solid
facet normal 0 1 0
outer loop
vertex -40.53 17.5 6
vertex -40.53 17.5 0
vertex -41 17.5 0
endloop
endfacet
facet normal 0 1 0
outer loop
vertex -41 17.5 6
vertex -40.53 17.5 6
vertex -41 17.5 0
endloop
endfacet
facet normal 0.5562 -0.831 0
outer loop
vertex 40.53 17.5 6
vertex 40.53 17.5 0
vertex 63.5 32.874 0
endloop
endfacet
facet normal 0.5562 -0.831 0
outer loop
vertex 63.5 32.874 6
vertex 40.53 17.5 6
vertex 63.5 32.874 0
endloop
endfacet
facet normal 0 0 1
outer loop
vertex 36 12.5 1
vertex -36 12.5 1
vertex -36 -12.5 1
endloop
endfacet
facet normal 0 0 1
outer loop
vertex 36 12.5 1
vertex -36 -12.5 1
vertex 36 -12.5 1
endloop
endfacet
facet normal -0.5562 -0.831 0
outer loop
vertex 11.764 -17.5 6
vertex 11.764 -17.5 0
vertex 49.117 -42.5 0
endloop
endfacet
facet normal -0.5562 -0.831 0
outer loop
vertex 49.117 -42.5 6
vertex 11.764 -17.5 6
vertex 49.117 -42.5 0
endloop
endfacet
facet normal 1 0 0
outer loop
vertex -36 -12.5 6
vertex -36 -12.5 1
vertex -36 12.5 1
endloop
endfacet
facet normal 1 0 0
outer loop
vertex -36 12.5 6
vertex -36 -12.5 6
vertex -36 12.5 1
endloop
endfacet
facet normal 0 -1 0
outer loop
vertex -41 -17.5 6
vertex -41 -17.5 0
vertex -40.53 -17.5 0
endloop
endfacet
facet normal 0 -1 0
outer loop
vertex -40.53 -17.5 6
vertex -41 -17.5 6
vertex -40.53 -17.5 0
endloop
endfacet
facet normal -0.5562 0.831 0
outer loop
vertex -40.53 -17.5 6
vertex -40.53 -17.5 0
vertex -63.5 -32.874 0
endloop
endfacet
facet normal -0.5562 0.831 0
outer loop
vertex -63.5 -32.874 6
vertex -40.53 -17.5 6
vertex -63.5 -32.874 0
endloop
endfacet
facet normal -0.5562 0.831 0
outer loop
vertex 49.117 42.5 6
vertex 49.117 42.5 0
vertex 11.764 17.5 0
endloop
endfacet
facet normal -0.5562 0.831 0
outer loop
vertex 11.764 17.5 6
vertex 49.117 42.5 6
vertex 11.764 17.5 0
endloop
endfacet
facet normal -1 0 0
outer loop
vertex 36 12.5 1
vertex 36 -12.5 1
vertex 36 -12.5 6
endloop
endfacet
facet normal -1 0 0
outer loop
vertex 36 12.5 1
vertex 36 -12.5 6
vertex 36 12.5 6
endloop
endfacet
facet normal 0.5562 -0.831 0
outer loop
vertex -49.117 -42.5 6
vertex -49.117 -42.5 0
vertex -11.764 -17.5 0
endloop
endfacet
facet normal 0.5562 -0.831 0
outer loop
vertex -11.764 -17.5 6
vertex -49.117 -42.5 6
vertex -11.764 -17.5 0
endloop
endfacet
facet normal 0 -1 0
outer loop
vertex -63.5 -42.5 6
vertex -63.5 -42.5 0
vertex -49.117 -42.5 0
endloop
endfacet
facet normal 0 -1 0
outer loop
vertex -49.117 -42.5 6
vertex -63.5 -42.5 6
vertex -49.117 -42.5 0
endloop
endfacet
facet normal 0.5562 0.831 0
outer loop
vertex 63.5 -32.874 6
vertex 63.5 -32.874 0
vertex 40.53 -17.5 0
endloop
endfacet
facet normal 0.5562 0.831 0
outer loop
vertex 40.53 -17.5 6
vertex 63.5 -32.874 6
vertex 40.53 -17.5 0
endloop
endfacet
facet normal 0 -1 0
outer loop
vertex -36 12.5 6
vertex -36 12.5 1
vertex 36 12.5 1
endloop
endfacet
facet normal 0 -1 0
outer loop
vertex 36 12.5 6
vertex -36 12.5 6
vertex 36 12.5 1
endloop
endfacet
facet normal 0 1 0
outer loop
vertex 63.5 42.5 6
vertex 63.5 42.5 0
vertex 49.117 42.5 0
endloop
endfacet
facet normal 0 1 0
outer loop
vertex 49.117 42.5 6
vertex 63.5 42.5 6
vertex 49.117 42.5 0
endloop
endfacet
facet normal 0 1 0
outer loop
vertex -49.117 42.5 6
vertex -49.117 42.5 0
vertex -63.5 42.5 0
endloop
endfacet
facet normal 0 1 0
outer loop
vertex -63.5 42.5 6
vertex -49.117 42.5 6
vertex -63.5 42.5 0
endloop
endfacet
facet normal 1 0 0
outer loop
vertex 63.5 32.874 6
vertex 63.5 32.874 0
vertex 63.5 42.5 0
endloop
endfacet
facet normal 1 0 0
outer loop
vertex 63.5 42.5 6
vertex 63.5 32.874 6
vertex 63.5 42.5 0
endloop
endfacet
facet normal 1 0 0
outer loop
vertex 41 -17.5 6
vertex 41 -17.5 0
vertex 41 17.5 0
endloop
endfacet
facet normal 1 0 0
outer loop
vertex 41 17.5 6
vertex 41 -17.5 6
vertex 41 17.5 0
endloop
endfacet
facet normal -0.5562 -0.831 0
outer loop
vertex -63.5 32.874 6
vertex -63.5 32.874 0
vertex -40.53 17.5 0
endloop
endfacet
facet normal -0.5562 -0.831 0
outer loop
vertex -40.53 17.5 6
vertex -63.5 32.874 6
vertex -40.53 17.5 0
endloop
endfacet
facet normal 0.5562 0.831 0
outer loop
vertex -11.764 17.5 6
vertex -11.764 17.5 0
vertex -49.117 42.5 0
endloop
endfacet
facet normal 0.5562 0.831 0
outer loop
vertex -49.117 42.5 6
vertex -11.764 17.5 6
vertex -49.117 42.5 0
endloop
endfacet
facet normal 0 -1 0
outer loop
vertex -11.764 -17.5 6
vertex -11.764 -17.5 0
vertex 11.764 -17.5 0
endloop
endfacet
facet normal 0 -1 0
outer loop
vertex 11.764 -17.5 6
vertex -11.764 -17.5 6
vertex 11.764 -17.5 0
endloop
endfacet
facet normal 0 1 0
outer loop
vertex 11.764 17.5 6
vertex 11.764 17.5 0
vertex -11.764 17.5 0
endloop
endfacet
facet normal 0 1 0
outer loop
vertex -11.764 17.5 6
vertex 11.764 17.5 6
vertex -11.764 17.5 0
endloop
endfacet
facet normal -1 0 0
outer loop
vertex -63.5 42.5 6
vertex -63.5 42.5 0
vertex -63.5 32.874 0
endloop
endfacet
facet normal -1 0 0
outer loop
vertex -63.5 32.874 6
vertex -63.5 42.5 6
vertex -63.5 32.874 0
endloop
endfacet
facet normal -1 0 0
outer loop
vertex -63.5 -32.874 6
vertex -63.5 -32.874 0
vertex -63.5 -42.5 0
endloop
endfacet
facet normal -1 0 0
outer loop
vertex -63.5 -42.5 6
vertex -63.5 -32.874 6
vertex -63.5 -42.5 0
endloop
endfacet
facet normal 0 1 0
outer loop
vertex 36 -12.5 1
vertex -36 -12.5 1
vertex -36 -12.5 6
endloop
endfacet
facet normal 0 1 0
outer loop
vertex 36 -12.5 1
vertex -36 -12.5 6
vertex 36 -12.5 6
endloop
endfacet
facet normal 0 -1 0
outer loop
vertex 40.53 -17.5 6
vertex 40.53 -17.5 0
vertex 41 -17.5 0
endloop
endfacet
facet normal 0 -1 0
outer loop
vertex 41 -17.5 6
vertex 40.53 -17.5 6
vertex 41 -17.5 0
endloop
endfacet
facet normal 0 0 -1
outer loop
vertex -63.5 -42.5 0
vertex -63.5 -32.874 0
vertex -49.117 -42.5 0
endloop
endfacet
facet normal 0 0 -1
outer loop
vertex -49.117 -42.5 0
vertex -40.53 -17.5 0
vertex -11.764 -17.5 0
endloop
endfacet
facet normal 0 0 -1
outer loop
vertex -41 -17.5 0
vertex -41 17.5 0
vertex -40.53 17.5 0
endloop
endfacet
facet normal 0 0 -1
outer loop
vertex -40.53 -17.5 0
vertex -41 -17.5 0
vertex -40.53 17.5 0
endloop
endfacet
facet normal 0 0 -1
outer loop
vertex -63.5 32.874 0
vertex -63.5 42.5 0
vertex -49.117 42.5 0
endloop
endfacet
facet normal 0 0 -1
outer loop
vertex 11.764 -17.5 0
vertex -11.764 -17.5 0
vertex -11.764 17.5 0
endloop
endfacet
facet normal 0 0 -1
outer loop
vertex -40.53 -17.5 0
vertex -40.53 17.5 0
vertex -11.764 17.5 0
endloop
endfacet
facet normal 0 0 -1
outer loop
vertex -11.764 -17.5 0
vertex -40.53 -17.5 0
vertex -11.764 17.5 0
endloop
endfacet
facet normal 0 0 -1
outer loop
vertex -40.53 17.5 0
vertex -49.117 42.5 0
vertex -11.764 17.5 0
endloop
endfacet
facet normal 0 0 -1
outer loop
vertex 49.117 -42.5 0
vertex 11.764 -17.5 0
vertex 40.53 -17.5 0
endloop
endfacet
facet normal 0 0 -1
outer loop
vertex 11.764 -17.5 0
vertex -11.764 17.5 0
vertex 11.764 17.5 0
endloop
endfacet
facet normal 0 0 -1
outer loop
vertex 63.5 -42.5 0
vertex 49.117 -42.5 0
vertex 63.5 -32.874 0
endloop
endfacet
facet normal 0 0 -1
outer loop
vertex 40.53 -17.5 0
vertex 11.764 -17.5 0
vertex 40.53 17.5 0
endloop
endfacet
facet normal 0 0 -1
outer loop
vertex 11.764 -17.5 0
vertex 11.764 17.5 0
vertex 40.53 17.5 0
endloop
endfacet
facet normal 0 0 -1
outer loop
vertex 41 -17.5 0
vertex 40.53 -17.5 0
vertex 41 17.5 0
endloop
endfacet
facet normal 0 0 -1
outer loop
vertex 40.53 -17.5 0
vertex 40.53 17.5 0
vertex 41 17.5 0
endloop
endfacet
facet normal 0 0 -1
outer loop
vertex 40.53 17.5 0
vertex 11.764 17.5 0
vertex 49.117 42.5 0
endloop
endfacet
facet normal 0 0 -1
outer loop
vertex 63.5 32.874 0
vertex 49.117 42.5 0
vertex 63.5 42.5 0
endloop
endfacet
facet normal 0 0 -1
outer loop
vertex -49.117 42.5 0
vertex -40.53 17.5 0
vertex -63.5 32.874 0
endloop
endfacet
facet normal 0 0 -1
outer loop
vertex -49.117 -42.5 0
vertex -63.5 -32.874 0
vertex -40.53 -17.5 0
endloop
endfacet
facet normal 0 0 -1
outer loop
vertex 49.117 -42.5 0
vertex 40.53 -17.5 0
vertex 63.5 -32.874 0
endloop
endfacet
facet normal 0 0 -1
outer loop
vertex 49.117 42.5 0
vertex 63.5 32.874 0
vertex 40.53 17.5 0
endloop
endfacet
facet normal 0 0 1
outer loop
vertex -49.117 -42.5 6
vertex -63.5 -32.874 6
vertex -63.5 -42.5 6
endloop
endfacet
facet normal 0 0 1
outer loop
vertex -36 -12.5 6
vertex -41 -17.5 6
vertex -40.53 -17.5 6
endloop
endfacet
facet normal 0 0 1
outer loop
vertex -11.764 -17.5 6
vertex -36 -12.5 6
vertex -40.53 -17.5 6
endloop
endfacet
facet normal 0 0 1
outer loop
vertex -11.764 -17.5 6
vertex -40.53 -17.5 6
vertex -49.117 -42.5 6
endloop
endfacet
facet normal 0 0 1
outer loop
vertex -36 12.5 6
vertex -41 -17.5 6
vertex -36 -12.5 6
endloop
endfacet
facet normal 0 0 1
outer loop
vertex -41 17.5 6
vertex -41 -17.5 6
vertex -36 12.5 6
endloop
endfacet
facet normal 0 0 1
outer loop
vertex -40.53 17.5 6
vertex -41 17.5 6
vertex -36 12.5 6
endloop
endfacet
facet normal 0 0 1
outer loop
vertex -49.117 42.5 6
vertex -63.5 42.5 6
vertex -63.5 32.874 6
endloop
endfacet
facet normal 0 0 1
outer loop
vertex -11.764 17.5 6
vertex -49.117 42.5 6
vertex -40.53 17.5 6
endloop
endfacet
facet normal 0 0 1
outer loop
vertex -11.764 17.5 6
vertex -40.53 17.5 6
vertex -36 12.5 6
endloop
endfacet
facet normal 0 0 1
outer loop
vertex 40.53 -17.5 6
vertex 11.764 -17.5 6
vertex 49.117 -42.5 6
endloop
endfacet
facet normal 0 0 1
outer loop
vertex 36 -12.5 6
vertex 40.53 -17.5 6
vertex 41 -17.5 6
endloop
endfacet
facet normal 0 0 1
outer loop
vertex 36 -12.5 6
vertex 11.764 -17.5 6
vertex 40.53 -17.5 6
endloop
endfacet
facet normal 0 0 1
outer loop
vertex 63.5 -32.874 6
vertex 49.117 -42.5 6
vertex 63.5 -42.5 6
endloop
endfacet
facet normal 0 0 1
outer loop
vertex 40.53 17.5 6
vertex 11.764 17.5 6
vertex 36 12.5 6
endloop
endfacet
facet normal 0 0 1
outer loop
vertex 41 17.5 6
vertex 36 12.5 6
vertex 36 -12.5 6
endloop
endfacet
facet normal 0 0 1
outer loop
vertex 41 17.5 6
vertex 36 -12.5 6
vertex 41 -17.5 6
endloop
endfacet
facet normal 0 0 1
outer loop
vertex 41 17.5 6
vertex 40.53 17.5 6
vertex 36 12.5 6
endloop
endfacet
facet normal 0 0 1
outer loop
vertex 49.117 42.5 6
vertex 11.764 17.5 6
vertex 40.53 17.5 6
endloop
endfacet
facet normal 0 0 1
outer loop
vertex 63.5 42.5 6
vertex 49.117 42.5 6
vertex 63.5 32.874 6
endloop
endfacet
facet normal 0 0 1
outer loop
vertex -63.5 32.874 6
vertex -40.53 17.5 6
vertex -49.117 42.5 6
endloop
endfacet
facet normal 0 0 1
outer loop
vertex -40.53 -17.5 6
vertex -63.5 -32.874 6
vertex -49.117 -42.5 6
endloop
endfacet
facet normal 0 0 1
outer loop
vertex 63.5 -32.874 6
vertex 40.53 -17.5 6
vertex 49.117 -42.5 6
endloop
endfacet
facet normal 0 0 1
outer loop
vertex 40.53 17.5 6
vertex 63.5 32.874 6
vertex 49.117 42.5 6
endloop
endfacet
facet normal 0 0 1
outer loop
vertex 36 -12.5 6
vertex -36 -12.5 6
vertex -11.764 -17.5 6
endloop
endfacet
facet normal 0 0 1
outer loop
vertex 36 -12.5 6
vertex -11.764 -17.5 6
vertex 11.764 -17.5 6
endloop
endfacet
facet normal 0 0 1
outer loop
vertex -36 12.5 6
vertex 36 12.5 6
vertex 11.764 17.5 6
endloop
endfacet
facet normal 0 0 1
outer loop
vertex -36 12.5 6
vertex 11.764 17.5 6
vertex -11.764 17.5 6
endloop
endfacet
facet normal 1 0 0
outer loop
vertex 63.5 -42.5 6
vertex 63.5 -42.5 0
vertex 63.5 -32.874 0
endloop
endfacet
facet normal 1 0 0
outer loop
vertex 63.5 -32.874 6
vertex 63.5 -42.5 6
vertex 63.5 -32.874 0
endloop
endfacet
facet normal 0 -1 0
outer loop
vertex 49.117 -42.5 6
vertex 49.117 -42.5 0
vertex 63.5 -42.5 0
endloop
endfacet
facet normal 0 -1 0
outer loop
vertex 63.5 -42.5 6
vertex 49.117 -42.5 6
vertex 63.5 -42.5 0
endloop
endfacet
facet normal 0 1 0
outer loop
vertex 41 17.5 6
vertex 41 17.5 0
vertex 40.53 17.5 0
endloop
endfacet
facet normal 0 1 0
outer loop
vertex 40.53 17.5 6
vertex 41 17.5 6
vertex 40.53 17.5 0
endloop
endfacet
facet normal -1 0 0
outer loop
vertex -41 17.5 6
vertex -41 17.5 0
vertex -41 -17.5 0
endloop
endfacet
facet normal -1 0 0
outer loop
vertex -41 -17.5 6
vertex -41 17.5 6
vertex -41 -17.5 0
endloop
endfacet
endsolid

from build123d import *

# Parameters (mm, degrees)
F0_W     = 72
F0_H     = 25
F1_DEPTH = 6
F2_DEPTH = 1


with BuildPart() as f1:
    # F0 (on Top) → F1 (new body)
    with BuildSketch(Plane.XY):
        Polygon((-49.116927, 42.5), (-63.5, 42.5), (-63.5, 32.873533), (-40.530132, 17.5), (-41, 17.5), (-41, -17.5), (-40.530132, -17.5), (-63.5, -32.873533), (-63.5, -42.5), (-49.116927, -42.5), (-11.763985, -17.5), (11.763985, -17.5), (49.116927, -42.5), (63.5, -42.5), (63.5, -32.873533), (40.530132, -17.5), (41, -17.5), (41, 17.5), (40.530132, 17.5), (63.5, 32.873533), (63.5, 42.5), (49.116927, 42.5), (11.763985, 17.5), (-11.763985, 17.5), align=None)
        Rectangle(F0_W, F0_H, mode=Mode.SUBTRACT)
    extrude(amount=F1_DEPTH)

    # F0 (on Top) → F2 (join)
    with BuildSketch(Plane.XY):
        Rectangle(F0_W, F0_H)
    extrude(amount=F2_DEPTH)


solid = f1.part
